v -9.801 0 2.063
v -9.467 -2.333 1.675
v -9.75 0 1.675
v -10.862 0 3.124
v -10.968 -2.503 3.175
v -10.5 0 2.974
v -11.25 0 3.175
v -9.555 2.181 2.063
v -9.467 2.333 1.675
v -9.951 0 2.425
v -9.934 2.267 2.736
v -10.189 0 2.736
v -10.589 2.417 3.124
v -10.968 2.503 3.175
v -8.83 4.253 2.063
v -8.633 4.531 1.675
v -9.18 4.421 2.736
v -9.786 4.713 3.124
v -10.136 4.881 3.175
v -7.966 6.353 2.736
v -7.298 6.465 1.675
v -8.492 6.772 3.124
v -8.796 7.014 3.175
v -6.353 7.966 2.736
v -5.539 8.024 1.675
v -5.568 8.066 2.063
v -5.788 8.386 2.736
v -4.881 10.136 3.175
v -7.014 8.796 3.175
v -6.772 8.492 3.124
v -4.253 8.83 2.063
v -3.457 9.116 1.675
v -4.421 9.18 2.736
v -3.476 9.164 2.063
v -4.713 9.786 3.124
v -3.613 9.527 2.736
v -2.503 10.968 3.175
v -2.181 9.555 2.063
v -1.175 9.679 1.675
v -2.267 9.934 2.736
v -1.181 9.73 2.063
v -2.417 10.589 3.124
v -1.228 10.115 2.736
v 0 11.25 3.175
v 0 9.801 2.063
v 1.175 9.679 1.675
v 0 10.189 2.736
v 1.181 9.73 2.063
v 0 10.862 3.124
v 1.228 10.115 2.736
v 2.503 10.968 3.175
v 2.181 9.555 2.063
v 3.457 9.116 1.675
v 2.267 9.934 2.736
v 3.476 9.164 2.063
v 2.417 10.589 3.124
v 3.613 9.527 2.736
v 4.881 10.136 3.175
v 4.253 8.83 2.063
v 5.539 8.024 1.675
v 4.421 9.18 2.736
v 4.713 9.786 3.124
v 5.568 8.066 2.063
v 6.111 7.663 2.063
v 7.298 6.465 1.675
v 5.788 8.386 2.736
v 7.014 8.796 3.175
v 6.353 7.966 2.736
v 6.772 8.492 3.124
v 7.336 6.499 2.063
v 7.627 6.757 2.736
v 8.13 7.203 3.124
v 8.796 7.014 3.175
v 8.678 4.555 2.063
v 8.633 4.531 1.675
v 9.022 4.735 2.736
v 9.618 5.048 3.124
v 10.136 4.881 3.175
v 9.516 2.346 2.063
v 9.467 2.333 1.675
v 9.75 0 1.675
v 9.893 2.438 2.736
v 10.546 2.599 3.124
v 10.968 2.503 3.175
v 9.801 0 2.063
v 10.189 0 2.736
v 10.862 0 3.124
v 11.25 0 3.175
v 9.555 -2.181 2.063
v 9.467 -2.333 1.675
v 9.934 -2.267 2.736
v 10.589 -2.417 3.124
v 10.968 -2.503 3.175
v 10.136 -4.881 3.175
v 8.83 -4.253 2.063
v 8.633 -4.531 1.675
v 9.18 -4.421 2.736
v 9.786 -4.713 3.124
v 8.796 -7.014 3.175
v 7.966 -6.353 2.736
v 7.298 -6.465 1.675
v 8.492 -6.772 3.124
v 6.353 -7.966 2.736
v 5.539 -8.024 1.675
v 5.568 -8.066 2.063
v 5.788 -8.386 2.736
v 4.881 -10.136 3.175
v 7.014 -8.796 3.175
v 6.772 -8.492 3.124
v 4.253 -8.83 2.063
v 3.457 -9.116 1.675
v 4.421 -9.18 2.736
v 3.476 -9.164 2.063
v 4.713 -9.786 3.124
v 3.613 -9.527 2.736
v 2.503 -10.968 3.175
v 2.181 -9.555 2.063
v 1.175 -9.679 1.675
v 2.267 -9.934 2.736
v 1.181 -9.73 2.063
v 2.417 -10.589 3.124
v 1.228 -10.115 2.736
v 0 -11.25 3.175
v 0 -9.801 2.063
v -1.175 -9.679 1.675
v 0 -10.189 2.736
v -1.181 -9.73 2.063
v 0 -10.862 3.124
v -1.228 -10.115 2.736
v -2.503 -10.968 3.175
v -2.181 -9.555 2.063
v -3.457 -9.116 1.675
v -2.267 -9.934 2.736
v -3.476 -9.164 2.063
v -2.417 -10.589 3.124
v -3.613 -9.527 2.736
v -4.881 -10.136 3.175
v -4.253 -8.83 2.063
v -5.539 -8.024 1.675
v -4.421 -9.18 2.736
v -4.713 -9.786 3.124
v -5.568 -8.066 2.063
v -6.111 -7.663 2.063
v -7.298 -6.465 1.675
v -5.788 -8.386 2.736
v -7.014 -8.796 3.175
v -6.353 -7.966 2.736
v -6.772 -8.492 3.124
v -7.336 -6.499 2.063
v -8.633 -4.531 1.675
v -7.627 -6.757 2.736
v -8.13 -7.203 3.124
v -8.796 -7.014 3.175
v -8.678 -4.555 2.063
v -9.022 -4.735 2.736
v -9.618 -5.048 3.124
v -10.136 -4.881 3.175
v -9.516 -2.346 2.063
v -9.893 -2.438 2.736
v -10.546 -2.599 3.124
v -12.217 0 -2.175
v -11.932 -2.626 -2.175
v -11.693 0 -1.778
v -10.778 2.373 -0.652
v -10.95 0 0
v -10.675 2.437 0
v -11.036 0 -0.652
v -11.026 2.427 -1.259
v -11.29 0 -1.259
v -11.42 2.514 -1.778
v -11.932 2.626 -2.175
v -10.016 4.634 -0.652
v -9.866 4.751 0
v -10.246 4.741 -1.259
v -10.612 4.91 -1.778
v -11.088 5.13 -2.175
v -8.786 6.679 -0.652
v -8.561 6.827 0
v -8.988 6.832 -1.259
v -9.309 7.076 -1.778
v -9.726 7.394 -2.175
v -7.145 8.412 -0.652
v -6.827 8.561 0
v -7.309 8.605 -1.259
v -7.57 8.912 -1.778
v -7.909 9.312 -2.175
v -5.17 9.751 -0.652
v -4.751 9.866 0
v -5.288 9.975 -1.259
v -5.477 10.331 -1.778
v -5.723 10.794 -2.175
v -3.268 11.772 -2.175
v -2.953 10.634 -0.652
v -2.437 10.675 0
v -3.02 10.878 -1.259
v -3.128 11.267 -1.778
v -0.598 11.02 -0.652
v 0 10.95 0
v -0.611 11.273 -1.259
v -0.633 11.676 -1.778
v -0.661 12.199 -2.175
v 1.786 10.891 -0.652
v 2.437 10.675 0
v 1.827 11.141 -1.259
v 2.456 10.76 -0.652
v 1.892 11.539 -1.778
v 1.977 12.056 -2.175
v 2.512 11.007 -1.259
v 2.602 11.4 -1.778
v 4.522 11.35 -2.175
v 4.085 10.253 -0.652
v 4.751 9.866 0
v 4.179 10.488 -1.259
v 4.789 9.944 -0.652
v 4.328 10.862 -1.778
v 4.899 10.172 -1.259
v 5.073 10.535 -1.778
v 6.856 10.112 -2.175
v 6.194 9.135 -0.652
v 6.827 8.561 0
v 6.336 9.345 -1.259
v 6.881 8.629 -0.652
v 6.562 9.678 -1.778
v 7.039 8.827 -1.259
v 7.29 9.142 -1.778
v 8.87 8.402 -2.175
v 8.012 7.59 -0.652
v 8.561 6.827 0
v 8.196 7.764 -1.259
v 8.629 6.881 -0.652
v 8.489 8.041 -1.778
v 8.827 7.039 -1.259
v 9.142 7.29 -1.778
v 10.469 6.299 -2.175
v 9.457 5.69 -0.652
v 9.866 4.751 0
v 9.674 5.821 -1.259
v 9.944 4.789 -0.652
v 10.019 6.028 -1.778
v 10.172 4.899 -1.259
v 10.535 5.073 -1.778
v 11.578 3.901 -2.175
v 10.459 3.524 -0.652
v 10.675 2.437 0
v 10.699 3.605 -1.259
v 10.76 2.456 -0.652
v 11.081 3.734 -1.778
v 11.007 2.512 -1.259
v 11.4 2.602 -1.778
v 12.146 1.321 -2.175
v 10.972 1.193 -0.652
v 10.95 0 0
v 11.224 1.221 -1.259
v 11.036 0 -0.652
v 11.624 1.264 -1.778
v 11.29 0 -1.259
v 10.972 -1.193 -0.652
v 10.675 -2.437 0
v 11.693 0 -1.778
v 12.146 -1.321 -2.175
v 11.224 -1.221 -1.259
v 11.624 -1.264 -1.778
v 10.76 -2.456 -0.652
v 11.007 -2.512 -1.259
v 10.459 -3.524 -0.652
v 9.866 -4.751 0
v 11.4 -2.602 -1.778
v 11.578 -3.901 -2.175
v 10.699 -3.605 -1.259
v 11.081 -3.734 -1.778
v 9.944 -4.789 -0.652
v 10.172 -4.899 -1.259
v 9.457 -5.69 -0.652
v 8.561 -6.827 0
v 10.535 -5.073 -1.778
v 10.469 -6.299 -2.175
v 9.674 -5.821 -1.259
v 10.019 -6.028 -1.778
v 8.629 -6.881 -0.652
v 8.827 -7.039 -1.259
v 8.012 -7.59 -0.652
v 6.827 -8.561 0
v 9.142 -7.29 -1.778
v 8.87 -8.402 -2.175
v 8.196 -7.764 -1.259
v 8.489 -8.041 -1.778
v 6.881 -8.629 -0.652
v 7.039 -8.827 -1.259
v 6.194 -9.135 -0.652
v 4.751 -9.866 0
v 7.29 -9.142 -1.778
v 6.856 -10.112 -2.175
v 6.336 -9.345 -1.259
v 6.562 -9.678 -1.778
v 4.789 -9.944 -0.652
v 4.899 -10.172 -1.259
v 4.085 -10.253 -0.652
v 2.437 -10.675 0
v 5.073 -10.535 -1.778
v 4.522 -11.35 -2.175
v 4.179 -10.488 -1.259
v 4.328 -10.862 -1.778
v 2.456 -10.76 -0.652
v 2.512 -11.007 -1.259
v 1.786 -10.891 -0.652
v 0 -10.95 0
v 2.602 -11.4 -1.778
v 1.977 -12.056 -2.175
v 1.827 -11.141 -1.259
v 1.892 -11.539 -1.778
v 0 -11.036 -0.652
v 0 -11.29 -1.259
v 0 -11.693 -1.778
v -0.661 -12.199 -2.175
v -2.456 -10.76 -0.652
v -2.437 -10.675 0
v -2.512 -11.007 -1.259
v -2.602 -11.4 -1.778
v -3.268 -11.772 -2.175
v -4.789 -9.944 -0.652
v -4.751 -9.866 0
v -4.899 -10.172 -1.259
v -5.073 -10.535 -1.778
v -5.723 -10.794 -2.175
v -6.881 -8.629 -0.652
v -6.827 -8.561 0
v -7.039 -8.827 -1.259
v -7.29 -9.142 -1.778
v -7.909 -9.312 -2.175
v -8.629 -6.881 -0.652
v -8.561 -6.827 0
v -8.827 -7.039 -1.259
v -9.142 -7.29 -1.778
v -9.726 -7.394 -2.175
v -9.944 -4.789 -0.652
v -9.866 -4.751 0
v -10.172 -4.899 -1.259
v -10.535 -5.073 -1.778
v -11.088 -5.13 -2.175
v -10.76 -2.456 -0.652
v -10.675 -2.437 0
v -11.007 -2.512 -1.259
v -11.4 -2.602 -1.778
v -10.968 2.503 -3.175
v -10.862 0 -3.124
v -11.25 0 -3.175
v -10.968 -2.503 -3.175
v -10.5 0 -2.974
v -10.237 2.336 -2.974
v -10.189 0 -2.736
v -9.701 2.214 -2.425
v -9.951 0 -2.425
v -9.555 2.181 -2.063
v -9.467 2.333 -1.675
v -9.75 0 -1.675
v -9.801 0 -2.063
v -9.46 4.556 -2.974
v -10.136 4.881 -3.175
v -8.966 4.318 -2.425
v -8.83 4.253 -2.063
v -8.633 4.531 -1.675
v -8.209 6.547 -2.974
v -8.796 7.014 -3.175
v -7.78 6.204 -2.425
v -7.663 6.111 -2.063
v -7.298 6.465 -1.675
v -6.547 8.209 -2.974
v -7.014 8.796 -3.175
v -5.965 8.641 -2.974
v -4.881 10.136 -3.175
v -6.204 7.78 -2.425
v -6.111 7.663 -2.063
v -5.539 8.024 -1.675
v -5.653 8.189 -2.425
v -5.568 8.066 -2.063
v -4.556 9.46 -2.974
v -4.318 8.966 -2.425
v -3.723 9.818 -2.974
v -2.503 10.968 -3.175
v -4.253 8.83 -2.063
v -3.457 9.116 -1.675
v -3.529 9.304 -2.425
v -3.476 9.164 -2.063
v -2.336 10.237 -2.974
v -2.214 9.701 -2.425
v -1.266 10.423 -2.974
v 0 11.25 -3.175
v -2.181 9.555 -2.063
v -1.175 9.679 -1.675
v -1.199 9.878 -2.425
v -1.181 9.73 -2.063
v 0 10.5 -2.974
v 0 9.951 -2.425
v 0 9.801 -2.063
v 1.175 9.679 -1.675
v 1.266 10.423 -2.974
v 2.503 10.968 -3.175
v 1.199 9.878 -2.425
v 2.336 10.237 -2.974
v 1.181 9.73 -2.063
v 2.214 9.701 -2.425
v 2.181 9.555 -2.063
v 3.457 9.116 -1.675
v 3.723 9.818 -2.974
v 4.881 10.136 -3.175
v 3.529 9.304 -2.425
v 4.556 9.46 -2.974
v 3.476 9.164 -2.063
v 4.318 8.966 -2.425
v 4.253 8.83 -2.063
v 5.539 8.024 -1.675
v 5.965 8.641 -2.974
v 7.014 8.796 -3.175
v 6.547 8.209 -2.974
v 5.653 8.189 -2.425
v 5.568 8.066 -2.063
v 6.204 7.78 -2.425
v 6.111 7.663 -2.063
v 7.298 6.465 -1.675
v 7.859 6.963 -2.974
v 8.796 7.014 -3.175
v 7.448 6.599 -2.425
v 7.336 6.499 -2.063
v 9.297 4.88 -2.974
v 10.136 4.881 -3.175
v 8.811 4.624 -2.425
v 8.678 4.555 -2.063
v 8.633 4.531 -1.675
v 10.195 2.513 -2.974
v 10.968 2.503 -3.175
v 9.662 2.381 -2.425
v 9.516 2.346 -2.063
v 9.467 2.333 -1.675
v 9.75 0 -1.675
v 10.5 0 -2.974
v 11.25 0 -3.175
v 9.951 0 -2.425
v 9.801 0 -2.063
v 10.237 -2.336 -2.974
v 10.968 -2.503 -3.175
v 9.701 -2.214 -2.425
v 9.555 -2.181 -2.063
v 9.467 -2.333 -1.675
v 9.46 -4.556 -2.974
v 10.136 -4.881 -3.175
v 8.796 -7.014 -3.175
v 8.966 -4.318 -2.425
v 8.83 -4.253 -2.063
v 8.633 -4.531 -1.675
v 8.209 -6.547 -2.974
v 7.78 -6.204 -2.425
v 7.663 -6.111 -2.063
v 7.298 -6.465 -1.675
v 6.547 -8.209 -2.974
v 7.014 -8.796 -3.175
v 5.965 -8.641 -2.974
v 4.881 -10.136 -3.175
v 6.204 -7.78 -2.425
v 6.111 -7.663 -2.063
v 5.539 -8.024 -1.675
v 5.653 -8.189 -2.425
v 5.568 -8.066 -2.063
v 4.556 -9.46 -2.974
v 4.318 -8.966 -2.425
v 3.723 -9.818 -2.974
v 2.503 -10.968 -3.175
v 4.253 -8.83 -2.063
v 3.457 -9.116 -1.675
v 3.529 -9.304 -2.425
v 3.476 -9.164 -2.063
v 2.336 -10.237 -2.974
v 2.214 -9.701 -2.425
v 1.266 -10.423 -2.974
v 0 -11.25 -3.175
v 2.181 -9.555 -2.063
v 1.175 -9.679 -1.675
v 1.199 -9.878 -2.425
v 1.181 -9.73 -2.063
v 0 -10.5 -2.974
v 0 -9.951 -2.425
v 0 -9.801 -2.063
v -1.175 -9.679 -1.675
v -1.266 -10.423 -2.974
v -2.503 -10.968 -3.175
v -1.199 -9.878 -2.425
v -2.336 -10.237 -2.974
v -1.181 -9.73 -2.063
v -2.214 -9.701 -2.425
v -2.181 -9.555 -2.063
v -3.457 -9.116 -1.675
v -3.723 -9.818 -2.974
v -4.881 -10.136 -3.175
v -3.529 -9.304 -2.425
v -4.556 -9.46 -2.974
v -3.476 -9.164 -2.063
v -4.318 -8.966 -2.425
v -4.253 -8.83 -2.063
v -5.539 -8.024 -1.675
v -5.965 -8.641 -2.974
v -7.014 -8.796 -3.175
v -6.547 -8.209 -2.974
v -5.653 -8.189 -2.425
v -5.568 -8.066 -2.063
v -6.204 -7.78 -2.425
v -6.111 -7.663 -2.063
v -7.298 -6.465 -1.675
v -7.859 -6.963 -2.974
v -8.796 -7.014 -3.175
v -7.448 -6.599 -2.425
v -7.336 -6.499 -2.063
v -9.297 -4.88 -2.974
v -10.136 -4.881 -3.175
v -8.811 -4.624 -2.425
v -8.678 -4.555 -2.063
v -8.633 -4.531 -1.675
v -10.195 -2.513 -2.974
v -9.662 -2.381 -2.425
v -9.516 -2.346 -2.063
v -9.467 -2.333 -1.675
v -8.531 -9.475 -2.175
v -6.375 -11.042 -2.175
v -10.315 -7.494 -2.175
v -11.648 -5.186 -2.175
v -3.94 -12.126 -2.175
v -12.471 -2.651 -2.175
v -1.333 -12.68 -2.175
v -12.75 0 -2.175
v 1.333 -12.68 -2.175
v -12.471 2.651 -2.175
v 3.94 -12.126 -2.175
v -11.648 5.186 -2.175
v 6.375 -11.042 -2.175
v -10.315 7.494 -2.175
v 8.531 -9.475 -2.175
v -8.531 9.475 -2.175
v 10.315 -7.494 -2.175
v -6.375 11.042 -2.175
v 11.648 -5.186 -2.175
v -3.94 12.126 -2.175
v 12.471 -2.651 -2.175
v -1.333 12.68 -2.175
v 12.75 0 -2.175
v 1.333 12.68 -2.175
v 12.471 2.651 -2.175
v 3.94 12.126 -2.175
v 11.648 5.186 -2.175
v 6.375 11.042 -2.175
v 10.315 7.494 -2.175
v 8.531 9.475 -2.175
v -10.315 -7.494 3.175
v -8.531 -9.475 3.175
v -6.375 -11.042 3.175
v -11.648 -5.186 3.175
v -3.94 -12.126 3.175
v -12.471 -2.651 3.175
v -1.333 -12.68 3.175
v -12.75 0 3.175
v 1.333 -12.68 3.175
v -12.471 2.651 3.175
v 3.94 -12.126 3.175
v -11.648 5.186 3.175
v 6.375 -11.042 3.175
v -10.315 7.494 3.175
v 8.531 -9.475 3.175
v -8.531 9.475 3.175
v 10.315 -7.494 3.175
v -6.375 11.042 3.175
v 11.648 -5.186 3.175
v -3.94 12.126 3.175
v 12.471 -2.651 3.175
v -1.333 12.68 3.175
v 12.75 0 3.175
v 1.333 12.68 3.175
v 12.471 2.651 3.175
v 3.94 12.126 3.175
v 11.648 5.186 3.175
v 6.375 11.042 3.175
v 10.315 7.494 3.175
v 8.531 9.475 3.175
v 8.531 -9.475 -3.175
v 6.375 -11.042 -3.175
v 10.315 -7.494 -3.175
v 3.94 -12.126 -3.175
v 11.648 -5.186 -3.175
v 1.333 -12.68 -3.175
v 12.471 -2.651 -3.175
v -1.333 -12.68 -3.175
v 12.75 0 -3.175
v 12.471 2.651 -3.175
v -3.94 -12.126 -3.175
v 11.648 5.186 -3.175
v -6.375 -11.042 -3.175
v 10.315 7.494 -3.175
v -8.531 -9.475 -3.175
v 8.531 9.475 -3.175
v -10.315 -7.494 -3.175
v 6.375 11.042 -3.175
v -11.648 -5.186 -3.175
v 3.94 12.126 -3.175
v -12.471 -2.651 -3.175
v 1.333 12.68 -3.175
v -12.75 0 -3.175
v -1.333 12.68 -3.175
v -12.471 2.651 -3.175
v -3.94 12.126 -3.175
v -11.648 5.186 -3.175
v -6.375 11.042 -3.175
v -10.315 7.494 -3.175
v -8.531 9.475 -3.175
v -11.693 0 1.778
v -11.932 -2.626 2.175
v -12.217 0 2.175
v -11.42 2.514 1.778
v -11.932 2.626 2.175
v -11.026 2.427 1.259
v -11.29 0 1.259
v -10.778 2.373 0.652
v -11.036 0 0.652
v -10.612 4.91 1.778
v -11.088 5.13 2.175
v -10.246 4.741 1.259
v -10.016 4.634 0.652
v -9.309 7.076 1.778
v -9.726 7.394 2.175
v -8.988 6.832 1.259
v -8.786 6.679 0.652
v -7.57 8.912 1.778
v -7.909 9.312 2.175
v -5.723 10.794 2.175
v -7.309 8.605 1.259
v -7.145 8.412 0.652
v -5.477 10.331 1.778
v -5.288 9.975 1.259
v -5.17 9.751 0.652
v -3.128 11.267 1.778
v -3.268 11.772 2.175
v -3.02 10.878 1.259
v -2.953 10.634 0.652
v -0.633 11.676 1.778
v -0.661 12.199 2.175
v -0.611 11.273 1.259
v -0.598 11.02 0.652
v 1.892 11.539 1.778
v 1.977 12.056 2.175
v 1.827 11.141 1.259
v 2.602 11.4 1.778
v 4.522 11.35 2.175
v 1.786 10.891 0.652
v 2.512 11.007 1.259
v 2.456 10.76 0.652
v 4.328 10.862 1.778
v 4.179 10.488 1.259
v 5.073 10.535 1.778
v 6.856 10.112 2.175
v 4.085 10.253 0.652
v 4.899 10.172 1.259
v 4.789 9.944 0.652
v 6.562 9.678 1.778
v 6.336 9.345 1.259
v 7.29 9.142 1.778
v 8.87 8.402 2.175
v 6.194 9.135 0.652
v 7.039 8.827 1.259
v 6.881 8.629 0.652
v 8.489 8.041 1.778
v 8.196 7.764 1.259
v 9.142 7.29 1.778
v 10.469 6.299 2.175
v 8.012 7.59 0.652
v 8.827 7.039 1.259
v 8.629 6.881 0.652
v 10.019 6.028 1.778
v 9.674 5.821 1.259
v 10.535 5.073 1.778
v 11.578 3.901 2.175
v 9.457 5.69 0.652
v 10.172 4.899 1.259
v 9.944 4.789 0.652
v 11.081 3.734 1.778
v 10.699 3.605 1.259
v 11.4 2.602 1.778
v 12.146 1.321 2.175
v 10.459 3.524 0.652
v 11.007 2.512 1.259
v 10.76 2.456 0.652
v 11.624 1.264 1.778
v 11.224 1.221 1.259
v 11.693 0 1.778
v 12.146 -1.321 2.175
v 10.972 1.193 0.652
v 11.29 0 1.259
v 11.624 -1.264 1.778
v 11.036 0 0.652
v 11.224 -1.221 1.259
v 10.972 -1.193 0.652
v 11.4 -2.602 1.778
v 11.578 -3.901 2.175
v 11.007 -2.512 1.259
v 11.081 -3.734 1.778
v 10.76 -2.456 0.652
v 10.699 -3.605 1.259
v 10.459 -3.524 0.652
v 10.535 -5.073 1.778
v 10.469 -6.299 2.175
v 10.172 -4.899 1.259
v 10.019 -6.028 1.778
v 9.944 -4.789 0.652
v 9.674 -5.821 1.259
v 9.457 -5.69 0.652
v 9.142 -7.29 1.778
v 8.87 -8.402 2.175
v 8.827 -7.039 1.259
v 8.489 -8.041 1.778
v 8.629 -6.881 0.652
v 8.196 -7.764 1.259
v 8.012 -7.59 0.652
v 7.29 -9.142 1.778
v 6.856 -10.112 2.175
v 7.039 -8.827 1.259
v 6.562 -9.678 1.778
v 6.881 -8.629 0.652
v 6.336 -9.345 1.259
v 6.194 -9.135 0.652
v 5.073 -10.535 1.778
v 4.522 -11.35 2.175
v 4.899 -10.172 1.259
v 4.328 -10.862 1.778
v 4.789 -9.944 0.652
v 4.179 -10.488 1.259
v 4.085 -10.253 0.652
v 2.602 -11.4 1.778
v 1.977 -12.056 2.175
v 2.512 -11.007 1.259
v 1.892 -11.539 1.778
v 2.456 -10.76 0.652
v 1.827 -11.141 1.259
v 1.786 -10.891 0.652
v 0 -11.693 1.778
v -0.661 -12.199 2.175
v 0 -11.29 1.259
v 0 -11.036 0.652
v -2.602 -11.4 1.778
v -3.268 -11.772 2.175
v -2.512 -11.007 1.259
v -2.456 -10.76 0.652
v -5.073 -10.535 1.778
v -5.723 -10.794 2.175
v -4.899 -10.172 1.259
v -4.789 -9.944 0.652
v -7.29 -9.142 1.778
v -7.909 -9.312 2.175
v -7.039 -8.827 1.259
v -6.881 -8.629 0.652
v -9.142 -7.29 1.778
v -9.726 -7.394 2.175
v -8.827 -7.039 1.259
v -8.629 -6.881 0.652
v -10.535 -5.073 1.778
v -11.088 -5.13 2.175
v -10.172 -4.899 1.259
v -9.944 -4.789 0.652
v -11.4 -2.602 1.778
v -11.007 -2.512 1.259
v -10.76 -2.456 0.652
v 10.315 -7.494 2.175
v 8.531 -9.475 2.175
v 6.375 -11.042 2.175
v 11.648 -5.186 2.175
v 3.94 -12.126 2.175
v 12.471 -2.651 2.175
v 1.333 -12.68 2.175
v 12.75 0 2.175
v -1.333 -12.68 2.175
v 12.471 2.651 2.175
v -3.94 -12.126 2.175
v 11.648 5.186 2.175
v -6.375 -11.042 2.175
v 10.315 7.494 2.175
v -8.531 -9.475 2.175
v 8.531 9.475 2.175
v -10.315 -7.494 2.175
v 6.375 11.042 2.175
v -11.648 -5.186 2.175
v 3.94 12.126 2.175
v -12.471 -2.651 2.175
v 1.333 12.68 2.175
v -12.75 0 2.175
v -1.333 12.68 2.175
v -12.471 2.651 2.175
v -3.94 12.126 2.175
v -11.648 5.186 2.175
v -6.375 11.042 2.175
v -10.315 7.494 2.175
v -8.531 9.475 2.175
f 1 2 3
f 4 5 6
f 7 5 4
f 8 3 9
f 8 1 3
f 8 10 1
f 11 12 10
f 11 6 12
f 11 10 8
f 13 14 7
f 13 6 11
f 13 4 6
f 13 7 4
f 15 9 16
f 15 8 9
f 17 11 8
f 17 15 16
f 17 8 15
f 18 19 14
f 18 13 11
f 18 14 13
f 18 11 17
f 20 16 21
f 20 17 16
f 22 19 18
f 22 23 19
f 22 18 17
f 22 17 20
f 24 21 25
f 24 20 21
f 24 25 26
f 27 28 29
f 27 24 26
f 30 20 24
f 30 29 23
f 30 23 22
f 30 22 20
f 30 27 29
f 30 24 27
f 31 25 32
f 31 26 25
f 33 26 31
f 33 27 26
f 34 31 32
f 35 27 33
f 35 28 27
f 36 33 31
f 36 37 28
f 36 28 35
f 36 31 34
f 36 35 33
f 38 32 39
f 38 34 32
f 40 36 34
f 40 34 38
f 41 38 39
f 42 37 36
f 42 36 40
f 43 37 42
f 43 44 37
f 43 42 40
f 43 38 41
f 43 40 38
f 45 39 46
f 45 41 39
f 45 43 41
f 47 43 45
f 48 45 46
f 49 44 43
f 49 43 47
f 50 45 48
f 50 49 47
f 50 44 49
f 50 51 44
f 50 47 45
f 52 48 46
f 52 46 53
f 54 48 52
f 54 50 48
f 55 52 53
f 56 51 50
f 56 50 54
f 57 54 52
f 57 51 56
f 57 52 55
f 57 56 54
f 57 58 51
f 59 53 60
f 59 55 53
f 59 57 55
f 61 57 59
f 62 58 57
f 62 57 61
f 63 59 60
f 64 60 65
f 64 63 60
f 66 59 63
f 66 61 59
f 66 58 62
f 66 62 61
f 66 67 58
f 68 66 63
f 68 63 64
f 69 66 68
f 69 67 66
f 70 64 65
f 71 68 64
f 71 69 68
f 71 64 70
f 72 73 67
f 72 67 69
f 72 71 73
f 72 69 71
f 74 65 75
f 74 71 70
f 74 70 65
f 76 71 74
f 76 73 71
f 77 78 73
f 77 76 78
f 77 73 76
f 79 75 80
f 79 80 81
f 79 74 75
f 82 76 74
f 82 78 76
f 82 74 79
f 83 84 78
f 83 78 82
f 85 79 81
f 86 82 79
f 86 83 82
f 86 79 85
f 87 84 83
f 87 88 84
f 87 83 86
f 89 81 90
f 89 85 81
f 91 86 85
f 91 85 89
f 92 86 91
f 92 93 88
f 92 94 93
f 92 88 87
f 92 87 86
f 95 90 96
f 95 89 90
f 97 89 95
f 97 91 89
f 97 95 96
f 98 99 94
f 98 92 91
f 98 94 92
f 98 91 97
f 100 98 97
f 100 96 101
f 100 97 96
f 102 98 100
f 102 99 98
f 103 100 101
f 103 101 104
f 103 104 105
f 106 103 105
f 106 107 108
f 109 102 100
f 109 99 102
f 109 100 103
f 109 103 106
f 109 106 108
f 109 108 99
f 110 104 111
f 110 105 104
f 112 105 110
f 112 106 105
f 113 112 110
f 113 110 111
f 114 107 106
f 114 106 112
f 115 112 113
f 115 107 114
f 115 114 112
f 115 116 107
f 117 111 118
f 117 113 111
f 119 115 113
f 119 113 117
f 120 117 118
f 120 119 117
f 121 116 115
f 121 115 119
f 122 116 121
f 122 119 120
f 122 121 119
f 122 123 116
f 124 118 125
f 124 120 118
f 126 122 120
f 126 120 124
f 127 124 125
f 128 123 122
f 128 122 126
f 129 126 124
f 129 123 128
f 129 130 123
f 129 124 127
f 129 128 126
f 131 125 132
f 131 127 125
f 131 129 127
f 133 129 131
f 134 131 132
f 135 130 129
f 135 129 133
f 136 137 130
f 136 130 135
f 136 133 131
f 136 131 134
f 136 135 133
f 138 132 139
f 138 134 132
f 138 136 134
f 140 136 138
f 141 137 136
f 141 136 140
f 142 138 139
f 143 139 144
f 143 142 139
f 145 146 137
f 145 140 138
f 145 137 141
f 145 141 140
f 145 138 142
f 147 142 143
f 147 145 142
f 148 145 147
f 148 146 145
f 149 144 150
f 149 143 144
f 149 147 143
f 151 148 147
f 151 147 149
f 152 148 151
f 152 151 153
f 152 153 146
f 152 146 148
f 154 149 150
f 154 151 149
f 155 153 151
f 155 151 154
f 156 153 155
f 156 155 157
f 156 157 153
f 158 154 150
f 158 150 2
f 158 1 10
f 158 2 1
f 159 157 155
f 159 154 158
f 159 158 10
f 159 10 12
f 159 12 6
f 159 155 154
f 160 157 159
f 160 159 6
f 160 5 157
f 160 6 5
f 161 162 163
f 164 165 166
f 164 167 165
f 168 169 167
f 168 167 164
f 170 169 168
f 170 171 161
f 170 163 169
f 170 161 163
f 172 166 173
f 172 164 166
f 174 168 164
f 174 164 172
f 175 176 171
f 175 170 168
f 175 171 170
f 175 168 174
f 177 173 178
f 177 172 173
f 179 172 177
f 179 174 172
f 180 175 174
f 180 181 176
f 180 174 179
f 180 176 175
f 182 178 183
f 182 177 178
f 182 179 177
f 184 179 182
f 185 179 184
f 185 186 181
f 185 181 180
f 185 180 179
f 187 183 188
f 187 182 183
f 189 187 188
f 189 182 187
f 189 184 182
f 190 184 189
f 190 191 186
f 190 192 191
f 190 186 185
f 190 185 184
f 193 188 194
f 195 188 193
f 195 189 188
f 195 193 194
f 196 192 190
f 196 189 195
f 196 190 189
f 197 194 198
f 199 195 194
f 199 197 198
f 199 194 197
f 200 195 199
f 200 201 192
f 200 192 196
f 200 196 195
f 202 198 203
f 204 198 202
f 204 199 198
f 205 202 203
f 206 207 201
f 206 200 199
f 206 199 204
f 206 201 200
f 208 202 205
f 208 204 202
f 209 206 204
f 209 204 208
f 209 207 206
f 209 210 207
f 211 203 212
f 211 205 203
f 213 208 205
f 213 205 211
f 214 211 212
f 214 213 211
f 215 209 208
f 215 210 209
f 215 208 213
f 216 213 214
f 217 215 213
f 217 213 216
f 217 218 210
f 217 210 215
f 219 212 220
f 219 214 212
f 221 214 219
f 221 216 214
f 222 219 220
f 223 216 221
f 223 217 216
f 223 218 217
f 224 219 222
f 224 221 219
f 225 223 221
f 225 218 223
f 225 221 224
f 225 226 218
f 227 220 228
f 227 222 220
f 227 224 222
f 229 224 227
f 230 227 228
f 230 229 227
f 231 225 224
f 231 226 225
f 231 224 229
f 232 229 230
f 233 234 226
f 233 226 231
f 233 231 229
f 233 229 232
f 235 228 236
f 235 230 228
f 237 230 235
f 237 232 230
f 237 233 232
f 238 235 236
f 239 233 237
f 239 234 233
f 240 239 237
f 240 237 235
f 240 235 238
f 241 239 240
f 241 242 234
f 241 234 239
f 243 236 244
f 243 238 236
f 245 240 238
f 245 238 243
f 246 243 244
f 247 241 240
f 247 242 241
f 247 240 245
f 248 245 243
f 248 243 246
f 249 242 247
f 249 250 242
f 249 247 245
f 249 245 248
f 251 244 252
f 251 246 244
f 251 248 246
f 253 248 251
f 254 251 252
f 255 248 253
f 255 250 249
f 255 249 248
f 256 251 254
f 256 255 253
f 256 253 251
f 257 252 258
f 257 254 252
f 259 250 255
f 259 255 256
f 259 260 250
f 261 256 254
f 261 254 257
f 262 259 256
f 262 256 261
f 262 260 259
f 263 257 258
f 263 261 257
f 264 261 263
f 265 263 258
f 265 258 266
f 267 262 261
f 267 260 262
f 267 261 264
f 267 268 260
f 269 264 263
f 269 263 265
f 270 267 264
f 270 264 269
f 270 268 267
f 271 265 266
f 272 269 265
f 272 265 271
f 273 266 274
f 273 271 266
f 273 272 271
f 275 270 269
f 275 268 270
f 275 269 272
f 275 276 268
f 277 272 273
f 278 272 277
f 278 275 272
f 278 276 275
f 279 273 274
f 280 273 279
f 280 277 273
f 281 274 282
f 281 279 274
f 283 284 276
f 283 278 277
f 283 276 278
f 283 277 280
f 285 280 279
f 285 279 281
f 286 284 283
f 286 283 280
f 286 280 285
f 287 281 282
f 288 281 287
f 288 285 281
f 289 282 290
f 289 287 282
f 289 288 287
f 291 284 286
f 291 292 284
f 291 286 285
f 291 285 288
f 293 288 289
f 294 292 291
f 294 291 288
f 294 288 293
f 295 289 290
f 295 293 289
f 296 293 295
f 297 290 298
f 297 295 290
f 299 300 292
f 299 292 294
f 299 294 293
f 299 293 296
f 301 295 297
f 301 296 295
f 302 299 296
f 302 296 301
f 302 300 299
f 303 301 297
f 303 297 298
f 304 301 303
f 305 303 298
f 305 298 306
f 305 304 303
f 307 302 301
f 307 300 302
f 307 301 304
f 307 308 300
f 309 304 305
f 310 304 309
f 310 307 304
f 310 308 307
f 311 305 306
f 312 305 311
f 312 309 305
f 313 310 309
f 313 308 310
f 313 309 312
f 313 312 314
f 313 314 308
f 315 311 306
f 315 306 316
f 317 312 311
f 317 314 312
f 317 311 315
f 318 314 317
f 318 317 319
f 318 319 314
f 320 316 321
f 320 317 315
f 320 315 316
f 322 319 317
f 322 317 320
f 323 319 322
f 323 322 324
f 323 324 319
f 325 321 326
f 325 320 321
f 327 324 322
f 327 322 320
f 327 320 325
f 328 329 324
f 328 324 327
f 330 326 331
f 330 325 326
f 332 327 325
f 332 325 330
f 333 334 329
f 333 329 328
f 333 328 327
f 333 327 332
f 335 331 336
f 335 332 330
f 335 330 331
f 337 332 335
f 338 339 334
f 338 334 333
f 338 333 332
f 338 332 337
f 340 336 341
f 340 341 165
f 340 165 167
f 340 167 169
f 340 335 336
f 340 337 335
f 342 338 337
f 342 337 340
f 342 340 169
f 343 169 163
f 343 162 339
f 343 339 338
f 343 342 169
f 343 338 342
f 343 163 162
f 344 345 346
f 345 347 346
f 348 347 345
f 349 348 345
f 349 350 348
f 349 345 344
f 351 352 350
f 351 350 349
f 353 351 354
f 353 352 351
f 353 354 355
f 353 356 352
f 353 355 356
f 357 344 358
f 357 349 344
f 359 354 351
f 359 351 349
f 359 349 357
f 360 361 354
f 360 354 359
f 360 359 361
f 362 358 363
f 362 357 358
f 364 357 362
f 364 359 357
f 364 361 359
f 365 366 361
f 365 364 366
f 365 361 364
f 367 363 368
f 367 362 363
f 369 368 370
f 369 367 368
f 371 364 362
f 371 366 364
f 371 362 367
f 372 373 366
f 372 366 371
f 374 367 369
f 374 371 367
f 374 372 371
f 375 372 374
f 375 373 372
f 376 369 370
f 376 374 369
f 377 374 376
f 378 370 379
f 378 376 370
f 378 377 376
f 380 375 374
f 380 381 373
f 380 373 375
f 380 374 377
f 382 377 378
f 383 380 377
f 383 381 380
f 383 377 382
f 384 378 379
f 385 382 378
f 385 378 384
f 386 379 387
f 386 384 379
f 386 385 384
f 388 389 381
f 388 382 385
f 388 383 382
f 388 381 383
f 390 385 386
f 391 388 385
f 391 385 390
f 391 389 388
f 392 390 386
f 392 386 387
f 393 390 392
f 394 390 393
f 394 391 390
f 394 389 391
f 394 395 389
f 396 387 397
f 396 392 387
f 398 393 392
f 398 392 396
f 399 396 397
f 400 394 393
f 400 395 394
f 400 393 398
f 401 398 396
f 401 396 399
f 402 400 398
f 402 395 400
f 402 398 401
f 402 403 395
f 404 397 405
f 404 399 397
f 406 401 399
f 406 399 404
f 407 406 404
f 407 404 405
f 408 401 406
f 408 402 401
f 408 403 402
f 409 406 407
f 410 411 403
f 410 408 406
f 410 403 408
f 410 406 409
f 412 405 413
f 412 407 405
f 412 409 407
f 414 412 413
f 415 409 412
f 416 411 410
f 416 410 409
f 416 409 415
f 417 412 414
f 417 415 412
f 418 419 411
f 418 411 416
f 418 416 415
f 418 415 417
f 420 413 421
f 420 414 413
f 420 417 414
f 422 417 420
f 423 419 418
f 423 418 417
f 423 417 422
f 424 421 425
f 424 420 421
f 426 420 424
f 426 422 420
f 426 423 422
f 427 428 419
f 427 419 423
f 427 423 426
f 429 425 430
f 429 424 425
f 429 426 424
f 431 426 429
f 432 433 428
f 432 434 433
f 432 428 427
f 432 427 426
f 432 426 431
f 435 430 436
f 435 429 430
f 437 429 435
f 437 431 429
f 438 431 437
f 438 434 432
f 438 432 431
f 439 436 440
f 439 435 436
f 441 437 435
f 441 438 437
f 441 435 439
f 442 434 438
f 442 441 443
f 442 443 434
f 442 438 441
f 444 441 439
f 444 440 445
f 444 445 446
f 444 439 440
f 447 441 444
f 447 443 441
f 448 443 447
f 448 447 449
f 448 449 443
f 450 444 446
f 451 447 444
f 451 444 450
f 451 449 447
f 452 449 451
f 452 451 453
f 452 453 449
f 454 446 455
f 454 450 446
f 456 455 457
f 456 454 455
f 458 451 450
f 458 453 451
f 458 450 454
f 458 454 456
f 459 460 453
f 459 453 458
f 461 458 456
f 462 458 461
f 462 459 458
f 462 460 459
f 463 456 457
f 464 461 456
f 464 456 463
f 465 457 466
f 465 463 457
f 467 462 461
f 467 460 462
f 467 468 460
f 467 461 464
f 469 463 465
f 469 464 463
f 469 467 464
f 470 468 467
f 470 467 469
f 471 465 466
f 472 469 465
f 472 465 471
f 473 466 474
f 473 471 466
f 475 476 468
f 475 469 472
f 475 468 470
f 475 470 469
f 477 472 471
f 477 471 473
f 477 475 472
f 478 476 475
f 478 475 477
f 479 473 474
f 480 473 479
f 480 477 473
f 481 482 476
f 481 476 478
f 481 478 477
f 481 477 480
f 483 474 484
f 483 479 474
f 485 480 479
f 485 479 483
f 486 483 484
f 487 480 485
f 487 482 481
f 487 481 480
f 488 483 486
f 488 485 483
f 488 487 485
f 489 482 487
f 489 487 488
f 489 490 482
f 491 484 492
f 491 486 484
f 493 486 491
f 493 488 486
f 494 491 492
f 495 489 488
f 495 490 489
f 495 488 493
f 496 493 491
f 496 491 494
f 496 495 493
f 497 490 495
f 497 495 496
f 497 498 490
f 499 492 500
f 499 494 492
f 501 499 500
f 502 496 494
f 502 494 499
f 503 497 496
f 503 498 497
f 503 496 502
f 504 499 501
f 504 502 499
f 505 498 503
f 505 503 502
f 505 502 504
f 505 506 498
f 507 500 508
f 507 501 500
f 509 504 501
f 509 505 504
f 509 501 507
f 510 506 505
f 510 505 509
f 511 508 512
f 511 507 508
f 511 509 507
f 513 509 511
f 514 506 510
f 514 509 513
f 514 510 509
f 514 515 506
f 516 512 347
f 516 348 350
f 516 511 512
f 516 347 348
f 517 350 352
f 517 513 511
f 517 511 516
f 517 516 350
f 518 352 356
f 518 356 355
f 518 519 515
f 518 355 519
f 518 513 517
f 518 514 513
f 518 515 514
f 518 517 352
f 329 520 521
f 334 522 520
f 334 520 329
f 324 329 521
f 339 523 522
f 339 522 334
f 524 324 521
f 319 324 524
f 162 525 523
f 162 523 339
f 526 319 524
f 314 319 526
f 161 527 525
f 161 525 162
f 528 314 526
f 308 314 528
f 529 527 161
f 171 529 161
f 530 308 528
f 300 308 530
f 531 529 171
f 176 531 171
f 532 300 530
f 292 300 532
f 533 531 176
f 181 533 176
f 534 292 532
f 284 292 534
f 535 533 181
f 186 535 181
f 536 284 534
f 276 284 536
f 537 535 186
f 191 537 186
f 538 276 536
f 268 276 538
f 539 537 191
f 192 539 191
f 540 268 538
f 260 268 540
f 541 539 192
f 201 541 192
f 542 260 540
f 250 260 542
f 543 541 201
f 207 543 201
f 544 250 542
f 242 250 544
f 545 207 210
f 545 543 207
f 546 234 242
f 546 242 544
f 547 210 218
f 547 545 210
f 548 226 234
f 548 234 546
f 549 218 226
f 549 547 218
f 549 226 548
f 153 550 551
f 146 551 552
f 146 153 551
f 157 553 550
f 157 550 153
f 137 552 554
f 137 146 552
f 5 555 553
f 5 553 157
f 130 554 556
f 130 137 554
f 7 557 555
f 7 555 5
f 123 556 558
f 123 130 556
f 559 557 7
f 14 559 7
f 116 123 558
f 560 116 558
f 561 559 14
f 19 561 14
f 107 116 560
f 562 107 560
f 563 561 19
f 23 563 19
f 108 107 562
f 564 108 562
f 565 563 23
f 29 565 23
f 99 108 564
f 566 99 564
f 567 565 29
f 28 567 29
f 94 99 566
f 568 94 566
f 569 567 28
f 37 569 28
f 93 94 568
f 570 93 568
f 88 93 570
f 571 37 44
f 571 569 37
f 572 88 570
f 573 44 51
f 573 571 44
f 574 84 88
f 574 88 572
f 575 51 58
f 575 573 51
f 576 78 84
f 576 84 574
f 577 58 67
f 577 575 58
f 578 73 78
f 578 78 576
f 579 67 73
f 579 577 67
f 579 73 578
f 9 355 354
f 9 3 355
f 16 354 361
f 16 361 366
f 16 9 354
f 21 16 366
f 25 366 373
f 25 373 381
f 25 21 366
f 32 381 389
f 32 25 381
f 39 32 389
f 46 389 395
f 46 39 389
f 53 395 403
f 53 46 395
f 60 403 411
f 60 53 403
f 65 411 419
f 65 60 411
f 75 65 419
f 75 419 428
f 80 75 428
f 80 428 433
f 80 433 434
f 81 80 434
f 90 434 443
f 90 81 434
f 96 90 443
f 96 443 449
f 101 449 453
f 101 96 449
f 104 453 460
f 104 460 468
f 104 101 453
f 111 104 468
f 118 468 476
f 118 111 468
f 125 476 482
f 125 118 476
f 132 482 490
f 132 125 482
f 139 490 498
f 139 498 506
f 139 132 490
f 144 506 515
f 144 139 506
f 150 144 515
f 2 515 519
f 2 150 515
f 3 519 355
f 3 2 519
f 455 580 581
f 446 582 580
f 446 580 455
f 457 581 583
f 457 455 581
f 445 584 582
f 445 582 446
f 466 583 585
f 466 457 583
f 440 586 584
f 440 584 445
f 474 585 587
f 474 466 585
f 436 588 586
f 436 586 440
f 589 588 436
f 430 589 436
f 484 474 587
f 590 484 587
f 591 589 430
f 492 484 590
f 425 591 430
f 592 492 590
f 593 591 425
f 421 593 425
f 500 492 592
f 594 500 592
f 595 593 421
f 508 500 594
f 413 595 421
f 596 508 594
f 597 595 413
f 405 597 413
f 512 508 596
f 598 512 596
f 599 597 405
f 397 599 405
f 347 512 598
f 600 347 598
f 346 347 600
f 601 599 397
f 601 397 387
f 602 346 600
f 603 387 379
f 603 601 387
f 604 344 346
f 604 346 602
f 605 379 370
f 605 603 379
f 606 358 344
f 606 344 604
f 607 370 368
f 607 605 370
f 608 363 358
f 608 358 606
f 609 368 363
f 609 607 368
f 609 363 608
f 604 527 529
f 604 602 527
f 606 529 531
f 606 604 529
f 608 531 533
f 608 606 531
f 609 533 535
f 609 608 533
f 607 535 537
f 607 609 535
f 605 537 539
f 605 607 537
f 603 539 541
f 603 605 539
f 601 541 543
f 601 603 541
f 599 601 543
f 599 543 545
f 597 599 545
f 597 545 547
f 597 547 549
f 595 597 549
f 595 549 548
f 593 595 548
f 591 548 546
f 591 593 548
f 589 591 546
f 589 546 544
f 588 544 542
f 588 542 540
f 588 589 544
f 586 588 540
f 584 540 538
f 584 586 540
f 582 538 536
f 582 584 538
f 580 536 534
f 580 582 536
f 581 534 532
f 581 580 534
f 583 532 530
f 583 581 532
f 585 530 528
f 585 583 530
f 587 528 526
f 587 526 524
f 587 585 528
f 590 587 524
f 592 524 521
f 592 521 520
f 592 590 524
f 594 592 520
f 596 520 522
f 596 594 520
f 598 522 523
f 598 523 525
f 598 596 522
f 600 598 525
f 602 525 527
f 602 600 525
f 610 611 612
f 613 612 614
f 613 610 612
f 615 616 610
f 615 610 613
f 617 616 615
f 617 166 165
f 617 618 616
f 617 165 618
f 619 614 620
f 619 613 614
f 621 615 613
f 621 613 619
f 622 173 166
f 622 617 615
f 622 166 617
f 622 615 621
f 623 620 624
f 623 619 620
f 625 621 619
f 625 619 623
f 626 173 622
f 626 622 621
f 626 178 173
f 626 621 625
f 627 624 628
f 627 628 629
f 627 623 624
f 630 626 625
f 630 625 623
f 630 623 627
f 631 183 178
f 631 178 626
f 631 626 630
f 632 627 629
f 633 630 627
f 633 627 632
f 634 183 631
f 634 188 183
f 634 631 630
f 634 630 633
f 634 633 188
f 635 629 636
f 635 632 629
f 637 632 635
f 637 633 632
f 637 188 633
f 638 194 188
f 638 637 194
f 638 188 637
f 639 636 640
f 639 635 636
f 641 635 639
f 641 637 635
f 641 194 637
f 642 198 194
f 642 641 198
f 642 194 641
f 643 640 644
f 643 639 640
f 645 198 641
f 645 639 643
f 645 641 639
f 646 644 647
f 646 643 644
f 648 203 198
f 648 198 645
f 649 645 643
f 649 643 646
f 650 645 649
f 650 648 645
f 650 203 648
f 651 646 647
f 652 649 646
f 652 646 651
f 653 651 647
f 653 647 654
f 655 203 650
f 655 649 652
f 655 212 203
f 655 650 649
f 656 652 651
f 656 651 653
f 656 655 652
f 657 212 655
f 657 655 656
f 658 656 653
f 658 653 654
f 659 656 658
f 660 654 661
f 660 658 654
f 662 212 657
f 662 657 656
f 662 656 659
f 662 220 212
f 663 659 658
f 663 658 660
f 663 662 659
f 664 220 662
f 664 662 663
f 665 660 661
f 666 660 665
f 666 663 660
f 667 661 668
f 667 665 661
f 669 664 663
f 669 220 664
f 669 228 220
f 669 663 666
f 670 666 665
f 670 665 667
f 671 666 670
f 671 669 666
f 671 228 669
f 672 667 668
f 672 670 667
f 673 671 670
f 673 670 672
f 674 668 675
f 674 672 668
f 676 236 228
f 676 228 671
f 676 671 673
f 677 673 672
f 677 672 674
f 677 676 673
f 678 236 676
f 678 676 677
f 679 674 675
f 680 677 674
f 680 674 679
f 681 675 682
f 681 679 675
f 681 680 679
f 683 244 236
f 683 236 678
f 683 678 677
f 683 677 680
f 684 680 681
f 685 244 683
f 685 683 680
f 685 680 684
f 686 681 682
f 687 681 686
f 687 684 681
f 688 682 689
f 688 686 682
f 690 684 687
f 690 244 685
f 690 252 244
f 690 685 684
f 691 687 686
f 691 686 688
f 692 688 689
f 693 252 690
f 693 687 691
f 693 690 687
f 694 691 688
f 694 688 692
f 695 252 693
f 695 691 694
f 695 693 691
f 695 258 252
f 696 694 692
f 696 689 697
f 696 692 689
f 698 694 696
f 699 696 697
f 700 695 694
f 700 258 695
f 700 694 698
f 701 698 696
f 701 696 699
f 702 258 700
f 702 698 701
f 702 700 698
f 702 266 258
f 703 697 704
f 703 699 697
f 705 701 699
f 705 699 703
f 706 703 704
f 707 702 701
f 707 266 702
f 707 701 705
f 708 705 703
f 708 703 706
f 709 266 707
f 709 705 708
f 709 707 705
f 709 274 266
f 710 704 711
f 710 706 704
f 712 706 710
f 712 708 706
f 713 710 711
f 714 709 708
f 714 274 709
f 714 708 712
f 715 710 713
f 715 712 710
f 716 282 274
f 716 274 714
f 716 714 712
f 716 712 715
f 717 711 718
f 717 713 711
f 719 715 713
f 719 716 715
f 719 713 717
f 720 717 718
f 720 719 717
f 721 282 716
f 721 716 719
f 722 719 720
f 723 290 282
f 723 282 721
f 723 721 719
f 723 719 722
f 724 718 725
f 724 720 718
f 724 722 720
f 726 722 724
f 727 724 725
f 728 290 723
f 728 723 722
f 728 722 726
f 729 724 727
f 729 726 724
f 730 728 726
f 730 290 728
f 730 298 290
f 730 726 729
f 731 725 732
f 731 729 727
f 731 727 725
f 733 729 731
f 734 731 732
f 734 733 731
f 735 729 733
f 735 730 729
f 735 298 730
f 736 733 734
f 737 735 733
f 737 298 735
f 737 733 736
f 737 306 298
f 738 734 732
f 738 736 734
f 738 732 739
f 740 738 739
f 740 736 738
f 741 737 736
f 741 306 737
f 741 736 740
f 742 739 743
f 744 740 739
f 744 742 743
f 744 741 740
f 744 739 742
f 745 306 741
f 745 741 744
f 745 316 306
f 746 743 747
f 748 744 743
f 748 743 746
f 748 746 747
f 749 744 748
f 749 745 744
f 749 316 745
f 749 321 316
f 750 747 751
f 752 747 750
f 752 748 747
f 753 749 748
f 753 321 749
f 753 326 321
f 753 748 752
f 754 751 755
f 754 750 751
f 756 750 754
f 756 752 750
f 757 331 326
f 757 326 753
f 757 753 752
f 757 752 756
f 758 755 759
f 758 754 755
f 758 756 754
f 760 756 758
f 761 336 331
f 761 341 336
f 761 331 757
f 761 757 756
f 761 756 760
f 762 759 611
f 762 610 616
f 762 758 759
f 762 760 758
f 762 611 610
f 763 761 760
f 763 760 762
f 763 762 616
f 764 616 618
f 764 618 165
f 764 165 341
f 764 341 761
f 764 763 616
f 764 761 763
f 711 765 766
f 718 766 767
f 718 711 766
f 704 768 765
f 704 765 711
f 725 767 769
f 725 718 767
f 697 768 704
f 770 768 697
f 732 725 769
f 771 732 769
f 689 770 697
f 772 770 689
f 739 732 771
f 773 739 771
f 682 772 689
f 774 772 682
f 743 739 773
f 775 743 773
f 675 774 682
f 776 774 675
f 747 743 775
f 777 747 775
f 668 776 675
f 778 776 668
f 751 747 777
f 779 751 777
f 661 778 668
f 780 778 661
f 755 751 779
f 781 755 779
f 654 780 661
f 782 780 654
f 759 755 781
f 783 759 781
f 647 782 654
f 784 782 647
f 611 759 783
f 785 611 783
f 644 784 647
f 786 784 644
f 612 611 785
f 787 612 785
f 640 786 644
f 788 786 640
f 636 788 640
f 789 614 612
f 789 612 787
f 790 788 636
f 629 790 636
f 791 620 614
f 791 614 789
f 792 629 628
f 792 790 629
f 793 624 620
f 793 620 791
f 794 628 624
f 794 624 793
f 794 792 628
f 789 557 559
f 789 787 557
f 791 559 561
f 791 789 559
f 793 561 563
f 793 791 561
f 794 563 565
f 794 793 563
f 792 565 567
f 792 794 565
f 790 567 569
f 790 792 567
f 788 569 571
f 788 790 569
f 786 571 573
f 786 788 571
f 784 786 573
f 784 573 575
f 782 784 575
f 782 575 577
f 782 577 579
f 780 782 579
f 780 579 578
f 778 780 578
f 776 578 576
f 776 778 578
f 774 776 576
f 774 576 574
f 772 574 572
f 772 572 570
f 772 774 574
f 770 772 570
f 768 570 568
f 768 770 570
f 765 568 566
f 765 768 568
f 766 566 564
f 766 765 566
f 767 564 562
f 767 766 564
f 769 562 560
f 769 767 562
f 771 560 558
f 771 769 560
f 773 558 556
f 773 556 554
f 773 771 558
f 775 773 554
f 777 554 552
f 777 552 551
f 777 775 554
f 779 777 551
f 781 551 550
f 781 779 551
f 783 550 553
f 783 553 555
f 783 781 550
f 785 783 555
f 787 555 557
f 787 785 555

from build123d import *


with BuildPart() as f1:
    # F0 (on Front) → F1 (revolve)
    with BuildSketch(Plane.XZ):
        with BuildLine():
            Line((-9.75, -1.675), (-9.75, 1.675))
            ThreePointArc((-9.75, 1.675), (-10.18934, 2.73566), (-11.25, 3.175))
            Line((-11.25, 3.175), (-12.75, 3.175))
            Line((-12.75, 3.175), (-12.75, 2.175))
            Line((-12.75, 2.175), (-12.217371, 2.175))
            ThreePointArc((-12.217371, 2.175), (-11.289957, 1.258655), (-10.95, 0))
            ThreePointArc((-10.95, 0), (-11.289957, -1.258655), (-12.217371, -2.175))
            Line((-12.217371, -2.175), (-12.75, -2.175))
            Line((-12.75, -2.175), (-12.75, -3.175))
            Line((-12.75, -3.175), (-11.25, -3.175))
            ThreePointArc((-11.25, -3.175), (-10.18934, -2.73566), (-9.75, -1.675))
        make_face()
    revolve(axis=Axis((0, 0, 0.475), (0, 0, -1)))


solid = f1.part
